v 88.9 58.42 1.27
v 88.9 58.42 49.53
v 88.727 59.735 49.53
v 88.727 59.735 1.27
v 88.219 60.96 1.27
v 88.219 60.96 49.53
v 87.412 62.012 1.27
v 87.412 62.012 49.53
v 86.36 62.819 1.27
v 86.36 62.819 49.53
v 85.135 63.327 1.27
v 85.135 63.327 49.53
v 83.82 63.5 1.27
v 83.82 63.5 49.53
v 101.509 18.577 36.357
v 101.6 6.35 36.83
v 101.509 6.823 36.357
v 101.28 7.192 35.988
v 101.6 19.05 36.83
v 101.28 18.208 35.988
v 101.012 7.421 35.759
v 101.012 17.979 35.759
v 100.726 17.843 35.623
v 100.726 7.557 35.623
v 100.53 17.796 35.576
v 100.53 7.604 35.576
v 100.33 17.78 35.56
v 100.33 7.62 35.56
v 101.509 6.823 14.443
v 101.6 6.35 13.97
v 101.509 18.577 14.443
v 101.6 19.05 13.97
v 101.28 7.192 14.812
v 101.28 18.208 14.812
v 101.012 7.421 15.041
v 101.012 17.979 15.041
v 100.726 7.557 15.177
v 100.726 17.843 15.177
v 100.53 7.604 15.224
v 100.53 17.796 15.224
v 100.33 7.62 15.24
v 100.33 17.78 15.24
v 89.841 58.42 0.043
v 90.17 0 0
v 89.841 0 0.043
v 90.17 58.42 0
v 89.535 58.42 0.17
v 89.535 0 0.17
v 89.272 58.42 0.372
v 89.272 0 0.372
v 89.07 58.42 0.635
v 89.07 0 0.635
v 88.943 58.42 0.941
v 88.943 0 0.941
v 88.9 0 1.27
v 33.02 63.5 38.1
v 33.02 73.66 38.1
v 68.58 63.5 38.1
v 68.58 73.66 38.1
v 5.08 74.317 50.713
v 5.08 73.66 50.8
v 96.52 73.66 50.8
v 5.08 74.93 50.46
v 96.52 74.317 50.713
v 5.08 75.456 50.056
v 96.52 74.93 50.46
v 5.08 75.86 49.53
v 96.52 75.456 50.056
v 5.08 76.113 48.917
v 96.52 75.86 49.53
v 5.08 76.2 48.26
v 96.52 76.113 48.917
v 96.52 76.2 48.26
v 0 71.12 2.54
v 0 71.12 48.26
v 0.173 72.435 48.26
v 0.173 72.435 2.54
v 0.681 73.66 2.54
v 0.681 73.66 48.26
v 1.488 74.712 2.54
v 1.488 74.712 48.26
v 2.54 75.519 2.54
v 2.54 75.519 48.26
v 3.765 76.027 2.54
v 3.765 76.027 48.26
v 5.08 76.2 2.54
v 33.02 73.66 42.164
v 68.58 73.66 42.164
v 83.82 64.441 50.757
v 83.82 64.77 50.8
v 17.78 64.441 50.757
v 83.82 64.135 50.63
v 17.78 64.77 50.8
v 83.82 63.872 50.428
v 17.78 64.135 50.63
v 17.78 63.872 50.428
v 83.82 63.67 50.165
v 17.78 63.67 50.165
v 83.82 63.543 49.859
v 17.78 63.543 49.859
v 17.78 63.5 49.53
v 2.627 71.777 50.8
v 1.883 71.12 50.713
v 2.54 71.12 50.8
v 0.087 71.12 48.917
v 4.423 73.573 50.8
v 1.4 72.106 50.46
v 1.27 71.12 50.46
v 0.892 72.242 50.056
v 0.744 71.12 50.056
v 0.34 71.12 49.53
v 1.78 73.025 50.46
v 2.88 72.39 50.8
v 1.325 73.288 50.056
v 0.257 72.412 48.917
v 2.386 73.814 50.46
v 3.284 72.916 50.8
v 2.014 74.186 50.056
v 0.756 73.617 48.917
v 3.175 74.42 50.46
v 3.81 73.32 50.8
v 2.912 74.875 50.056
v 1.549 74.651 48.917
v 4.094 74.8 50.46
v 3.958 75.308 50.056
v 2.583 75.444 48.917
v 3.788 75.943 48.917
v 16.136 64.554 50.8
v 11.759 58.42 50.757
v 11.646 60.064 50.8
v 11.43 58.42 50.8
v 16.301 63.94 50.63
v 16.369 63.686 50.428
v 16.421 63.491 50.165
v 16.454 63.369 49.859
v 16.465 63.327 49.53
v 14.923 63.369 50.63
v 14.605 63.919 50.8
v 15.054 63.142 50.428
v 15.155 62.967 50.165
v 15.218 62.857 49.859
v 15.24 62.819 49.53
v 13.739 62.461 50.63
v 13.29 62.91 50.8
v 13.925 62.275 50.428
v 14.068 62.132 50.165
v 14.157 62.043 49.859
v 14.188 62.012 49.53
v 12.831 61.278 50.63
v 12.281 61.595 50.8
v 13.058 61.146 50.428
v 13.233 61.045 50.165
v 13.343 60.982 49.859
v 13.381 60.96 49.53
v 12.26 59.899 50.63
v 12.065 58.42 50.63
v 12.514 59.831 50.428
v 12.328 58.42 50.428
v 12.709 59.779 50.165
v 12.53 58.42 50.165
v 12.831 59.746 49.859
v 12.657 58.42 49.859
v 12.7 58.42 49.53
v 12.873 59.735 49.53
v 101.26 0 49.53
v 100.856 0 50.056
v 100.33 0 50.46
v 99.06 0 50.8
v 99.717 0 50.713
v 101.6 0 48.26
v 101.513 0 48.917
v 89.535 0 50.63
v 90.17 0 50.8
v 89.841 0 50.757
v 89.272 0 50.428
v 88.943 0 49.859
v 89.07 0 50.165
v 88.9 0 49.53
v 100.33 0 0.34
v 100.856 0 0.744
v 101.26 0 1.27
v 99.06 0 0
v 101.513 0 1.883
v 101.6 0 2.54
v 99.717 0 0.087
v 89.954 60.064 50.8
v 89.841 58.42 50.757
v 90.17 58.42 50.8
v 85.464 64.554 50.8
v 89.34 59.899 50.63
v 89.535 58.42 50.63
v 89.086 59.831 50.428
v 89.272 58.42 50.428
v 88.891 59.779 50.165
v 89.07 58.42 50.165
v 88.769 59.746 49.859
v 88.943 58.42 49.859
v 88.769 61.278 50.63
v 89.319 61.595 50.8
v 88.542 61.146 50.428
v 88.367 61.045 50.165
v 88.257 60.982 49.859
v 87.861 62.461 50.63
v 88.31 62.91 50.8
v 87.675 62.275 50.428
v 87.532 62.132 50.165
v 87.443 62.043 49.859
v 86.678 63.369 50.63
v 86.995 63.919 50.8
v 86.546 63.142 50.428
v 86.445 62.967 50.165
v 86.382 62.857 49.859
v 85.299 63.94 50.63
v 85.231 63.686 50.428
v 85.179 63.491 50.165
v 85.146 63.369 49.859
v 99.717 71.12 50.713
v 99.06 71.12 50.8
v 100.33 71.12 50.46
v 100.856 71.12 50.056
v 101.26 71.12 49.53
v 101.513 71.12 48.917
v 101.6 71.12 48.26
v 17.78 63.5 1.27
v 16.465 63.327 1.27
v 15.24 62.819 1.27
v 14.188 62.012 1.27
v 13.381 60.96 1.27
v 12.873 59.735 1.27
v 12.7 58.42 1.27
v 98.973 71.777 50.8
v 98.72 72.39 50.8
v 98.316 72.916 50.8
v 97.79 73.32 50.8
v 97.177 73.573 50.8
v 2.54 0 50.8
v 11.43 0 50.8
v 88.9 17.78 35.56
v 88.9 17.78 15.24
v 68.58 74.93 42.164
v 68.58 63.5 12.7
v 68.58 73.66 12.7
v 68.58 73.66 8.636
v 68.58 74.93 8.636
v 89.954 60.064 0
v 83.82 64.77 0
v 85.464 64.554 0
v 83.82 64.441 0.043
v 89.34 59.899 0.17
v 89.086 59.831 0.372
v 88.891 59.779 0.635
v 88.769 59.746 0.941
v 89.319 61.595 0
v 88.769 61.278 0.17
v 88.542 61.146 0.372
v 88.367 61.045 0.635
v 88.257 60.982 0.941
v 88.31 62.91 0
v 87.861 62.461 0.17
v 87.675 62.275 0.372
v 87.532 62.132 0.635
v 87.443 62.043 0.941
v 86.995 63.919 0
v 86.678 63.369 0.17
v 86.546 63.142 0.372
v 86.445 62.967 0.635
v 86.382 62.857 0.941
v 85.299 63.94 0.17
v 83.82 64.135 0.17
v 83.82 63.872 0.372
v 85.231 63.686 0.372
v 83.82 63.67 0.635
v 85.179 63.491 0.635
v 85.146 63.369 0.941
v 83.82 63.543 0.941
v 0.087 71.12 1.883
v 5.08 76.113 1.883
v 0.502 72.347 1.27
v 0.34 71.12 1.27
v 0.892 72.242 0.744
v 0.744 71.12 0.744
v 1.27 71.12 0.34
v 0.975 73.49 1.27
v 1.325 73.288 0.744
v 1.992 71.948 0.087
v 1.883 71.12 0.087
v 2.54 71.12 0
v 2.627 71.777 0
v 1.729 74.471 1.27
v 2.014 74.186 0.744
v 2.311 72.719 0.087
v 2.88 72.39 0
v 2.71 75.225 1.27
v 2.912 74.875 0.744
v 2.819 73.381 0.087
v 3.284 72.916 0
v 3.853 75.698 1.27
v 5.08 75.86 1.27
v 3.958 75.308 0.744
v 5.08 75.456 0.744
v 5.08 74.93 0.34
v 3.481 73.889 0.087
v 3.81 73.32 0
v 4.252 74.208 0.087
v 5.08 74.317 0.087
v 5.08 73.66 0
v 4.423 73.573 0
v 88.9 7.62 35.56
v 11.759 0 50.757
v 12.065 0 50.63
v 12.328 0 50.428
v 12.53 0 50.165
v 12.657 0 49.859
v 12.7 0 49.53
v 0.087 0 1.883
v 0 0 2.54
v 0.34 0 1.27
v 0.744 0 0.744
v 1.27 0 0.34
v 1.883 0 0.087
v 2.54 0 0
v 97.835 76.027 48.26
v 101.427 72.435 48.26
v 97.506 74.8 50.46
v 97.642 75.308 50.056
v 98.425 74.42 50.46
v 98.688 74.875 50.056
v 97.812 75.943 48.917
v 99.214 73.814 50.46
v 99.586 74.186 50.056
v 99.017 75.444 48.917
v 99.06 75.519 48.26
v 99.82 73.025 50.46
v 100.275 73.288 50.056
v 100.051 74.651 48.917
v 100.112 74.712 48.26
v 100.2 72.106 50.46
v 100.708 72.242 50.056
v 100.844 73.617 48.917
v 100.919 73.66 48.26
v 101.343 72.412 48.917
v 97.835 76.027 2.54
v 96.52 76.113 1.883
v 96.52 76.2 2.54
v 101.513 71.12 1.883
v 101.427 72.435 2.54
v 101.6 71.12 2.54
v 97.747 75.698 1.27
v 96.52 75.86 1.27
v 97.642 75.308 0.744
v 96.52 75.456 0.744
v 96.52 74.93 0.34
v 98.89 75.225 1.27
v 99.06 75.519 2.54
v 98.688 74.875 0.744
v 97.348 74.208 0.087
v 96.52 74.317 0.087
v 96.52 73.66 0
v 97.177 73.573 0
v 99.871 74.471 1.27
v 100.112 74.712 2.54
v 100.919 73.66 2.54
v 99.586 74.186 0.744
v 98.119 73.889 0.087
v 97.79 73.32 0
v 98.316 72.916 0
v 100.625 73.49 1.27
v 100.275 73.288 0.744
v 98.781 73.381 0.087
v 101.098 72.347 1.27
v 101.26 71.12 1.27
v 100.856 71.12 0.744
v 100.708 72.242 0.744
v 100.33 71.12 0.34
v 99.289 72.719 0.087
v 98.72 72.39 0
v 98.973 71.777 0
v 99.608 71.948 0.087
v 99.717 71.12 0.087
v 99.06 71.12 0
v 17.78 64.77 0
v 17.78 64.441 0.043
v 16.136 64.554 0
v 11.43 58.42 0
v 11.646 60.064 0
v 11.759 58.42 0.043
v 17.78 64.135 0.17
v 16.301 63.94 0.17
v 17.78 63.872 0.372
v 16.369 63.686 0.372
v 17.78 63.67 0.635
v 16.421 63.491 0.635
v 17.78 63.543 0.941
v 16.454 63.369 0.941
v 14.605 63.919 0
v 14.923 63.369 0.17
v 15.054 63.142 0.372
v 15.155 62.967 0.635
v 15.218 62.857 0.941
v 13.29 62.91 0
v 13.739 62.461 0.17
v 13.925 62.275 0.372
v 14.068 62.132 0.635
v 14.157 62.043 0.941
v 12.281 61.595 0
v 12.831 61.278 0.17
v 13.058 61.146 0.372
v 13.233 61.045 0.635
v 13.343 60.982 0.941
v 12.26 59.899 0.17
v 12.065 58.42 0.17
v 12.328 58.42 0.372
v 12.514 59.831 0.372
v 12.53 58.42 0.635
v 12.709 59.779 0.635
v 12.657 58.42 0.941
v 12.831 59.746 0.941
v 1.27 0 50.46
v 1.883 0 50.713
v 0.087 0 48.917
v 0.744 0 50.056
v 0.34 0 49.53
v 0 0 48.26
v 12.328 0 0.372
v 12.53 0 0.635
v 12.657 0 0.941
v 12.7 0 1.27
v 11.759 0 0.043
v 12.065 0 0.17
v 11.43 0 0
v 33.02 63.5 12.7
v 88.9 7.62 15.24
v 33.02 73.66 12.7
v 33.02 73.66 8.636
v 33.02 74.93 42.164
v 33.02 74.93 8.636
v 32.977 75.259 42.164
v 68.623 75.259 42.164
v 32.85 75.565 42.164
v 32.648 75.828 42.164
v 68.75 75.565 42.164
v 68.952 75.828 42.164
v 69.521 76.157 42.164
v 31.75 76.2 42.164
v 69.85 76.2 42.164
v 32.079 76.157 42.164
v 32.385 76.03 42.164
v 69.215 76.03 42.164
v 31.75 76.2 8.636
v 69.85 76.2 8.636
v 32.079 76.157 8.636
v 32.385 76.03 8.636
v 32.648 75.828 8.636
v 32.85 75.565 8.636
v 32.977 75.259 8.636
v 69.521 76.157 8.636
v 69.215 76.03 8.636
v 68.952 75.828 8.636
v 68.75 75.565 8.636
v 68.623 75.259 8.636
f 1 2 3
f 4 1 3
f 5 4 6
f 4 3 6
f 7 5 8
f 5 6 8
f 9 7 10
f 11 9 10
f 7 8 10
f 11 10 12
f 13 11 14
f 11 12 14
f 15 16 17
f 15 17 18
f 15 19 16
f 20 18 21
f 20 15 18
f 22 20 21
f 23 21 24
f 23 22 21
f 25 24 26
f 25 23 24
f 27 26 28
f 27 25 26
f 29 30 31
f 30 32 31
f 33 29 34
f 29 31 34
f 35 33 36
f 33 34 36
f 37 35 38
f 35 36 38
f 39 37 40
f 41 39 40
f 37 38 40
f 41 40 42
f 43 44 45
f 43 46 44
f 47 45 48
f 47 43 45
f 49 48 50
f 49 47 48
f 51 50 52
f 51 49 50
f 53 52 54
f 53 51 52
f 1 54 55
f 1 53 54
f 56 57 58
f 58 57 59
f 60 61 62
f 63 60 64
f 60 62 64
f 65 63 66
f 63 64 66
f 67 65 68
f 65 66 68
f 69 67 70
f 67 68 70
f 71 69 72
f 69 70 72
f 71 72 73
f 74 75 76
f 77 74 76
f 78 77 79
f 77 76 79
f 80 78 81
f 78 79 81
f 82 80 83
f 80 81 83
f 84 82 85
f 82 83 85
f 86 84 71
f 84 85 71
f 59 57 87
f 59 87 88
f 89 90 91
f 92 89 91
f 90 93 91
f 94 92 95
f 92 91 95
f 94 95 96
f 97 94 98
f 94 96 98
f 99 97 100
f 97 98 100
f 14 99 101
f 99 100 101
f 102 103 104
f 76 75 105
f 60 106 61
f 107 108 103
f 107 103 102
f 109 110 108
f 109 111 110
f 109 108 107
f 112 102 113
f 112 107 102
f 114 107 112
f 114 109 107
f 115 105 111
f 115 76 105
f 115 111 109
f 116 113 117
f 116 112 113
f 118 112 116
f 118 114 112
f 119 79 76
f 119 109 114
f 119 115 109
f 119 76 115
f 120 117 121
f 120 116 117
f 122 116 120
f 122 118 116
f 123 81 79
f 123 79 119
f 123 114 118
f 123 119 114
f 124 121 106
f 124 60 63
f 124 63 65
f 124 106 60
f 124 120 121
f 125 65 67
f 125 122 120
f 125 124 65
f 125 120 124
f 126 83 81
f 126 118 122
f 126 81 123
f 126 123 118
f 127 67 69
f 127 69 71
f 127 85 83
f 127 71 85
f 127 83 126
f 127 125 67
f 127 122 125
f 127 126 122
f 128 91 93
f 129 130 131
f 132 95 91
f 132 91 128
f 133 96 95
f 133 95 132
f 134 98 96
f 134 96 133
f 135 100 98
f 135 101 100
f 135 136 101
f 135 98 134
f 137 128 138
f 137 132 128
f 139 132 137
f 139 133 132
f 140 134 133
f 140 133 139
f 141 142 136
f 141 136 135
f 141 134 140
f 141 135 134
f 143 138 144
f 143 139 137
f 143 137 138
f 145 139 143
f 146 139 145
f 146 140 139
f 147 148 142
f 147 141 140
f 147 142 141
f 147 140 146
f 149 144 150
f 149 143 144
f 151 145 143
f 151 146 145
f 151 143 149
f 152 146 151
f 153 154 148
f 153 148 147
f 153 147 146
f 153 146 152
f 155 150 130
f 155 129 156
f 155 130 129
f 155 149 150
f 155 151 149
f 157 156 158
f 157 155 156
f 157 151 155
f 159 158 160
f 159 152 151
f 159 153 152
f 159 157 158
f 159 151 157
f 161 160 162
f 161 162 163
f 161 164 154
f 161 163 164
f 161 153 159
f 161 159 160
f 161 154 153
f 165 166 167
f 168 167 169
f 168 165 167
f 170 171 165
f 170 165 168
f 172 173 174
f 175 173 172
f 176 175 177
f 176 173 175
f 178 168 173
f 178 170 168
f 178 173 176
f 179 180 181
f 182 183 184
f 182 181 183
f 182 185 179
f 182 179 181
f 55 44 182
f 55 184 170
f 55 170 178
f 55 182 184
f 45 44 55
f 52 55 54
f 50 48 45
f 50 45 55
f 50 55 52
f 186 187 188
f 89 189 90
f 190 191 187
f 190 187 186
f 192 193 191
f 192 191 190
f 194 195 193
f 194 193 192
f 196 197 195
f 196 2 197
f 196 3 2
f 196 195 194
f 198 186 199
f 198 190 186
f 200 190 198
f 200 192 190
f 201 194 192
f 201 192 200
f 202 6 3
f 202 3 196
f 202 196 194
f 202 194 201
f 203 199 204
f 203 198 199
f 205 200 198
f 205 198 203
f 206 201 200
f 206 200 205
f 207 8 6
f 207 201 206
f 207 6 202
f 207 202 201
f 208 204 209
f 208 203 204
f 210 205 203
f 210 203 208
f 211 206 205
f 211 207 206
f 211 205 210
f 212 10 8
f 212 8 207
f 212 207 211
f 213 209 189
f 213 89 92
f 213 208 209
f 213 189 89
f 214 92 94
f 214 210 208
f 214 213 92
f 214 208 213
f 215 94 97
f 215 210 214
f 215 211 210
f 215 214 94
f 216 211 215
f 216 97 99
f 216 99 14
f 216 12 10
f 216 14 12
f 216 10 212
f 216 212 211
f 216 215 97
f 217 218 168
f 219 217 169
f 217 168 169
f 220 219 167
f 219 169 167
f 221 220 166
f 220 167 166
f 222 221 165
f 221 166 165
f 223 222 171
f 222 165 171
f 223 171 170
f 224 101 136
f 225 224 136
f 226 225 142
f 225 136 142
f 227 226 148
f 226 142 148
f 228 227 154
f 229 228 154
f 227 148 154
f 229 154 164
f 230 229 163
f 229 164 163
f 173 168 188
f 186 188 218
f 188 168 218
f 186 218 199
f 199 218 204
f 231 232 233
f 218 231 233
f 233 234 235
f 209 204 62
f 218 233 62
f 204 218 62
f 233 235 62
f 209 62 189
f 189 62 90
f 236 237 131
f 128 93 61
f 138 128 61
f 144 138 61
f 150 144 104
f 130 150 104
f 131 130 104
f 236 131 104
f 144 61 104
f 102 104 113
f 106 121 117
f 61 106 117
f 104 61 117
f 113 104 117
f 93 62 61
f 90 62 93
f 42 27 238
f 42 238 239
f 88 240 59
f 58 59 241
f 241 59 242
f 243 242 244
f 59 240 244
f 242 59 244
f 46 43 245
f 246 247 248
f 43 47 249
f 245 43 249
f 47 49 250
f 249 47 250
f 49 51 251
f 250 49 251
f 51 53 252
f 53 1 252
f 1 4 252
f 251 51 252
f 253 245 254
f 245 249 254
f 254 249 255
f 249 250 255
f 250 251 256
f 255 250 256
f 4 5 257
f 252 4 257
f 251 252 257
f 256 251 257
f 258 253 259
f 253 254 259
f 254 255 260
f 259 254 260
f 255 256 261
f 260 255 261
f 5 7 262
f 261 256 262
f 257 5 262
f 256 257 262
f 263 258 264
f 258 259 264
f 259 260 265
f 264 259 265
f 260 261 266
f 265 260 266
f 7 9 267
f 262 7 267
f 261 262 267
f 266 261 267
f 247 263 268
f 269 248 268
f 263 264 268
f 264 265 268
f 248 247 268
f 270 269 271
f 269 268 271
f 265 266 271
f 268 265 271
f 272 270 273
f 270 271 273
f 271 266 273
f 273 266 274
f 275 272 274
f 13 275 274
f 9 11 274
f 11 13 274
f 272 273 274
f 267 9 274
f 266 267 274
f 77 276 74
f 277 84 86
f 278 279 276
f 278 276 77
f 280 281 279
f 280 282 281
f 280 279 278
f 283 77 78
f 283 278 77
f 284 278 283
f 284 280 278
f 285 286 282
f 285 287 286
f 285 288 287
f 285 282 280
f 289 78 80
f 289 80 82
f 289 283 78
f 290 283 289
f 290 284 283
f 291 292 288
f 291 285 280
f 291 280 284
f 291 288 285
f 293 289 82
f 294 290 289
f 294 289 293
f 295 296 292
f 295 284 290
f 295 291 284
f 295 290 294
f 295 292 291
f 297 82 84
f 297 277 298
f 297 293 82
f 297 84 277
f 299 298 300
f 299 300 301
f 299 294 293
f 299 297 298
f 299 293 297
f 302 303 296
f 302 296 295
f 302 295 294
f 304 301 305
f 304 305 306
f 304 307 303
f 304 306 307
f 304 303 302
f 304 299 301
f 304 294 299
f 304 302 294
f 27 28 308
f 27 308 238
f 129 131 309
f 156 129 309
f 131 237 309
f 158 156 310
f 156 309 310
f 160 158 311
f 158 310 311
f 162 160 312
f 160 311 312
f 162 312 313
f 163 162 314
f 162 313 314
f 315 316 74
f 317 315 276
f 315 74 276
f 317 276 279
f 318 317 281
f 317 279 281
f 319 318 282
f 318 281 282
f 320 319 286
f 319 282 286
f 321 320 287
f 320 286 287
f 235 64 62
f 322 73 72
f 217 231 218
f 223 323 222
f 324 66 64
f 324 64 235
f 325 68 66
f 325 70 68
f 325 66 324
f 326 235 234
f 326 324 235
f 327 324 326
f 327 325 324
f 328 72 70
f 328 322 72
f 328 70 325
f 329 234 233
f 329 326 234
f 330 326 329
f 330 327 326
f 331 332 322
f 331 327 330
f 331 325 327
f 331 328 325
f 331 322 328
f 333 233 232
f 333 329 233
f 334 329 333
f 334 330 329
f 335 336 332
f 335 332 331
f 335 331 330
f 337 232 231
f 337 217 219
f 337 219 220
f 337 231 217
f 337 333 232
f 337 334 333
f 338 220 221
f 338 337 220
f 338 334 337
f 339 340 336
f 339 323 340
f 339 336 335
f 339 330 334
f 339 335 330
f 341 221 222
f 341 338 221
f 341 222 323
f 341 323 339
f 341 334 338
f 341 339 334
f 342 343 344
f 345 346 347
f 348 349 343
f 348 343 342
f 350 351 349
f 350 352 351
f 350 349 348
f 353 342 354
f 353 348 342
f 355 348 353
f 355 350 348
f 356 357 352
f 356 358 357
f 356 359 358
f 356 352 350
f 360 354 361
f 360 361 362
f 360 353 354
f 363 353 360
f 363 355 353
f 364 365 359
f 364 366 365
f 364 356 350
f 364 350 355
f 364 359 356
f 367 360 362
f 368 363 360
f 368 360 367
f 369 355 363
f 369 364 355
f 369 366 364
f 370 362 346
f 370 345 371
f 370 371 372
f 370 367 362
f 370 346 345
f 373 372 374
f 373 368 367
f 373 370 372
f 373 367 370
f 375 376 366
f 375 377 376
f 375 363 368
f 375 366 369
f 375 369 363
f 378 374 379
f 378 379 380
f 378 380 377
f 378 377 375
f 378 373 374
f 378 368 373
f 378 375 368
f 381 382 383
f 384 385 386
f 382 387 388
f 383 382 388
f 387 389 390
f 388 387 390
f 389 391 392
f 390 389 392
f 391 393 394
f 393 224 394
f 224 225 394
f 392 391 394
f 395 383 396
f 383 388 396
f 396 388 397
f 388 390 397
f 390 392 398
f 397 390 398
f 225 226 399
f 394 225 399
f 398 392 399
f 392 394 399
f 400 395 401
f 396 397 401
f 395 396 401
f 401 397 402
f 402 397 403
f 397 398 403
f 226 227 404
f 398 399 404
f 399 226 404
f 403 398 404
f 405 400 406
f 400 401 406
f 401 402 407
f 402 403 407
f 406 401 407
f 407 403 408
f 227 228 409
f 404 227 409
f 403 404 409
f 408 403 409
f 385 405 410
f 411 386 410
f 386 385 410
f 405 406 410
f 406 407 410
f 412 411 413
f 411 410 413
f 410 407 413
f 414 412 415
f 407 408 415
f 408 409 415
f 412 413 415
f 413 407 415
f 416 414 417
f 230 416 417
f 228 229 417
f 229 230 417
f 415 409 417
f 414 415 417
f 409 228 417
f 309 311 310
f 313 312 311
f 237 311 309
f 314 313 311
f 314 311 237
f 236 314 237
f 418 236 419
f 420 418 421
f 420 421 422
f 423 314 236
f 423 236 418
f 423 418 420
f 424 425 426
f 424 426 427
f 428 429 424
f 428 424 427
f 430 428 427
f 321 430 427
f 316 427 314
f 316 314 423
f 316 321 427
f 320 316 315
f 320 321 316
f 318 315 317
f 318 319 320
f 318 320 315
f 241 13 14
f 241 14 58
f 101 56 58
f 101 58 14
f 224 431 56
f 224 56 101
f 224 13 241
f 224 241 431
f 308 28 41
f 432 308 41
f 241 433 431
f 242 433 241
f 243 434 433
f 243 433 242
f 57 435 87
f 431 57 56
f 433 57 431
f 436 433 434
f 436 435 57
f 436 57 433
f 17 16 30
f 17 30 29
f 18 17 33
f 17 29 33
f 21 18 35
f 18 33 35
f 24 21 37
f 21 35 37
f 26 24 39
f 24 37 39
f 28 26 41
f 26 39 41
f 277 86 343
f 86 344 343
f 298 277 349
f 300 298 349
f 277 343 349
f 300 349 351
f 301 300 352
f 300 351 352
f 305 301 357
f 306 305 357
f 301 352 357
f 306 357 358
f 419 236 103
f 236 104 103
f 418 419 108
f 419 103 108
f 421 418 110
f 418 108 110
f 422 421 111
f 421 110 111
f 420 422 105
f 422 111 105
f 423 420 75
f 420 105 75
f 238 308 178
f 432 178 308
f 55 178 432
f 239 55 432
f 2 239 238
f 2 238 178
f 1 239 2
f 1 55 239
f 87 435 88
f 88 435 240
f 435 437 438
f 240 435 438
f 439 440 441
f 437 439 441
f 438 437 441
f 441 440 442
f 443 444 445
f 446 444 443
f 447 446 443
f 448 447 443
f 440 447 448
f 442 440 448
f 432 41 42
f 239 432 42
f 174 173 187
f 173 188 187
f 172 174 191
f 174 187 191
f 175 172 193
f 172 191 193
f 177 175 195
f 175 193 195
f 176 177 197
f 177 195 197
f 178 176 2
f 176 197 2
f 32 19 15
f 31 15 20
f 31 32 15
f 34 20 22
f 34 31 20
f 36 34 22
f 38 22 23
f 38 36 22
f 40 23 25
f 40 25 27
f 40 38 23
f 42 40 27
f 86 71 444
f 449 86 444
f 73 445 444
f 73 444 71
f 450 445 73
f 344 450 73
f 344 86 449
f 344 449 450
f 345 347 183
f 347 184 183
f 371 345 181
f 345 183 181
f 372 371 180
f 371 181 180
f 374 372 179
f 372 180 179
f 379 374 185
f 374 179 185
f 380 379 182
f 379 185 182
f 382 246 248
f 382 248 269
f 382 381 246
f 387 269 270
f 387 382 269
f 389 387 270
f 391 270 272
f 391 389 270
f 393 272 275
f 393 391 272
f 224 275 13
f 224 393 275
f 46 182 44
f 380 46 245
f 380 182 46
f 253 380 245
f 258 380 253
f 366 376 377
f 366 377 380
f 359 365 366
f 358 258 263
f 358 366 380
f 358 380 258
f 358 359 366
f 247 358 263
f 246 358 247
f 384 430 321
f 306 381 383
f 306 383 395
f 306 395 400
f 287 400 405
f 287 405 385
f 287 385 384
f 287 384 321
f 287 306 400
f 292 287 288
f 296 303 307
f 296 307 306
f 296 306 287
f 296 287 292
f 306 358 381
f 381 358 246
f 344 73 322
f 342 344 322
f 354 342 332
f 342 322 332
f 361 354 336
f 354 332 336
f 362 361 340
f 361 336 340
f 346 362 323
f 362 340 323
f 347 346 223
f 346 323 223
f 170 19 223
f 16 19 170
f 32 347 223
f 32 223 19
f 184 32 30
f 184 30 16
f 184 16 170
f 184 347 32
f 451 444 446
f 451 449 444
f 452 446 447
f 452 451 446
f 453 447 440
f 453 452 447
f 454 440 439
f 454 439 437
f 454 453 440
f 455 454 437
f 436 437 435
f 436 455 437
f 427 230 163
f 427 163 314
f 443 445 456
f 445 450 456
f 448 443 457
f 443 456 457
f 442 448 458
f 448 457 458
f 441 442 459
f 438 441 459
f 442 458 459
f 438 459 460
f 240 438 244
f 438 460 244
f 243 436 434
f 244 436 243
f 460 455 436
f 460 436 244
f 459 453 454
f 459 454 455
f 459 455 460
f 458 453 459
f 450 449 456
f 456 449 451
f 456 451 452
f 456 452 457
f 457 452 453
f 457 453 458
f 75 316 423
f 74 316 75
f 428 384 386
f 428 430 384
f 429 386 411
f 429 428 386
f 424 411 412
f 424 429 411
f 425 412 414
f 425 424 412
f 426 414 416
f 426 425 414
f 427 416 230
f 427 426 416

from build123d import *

# Parameters (mm, degrees)
BOSS_EXTRUDE1_DEPTH = 50.8
FILLET1_R           = 5.08
SKETCH2_W           = 35.56
SKETCH2_H           = 33.528
CUT_EXTRUDE1_DEPTH  = 2.54
SKETCH4_W           = 35.56
SKETCH4_H           = 25.4
CUT_EXTRUDE2_DEPTH  = 74.66
FILLET2_R           = 1.27
CUT_EXTRUDE3_REACH  = 103.6
SKETCH6_W           = 20.32
SKETCH6_H           = 10.16
FILLET3_R           = 2.54
FILLET4_R           = 1.27
FILLET5_R           = 1.27


with BuildPart() as part:
    # Sketch1 → Boss-Extrude1 (new body)
    with BuildSketch(Plane.XY):
        Polygon((0, 0), (0, 76.2), (101.6, 76.2), (101.6, 0), (88.9, 0), (88.9, 63.5), (12.7, 63.5), (12.7, 0), align=None)
    extrude(amount=BOSS_EXTRUDE1_DEPTH)

    # Fillet1
    fillet1_edges = [part.edges().sort_by_distance(p)[0] for p in [
        (0, 76.2, 25.4),
        (101.6, 76.2, 25.4),
        (88.9, 63.5, 25.4),
        (12.7, 63.5, 25.4),
    ]]
    fillet(fillet1_edges, radius=FILLET1_R)

    # Sketch2 → Cut-Extrude1 (cut)
    with BuildSketch(Plane(origin=(0, 76.2, 0), x_dir=(1, 0, 0), z_dir=(0, 1, 0))):
        with Locations((50.8, -25.4)):
            Rectangle(SKETCH2_W, SKETCH2_H)
    extrude(amount=-CUT_EXTRUDE1_DEPTH, mode=Mode.SUBTRACT)

    # Sketch4 → Cut-Extrude2 (cut, through all)
    with BuildSketch(Plane(origin=(0, 73.66, 0), x_dir=(1, 0, 0), z_dir=(0, 1, 0))):
        with Locations((50.8, -25.4)):
            Rectangle(SKETCH4_W, SKETCH4_H)
    extrude(amount=-CUT_EXTRUDE2_DEPTH, mode=Mode.SUBTRACT)

    # Fillet2
    fillet2_edges = [part.edges().sort_by_distance(p)[0] for p in [
        (68.58, 76.2, 25.4),
        (33.02, 76.2, 25.4),
    ]]
    fillet(fillet2_edges, radius=FILLET2_R)

    # Sketch6 → Cut-Extrude3 (cut, up to next)
    with BuildSketch(Plane(origin=(101.6, 0, 0), x_dir=(0, 0, -1), z_dir=(1, 0, 0)), mode=Mode.PRIVATE) as cut_extrude3_sk1:
        with Locations((-25.4, 12.7)):
            Rectangle(SKETCH6_W, SKETCH6_H)
    cut_extrude3_tool1 = extrude(cut_extrude3_sk1.sketch, amount=-CUT_EXTRUDE3_REACH, mode=Mode.PRIVATE) & part.part
    add(cut_extrude3_tool1.solids().sort_by_distance((101.6, 12.7, 25.4))[0], mode=Mode.SUBTRACT)

    # Fillet3
    fillet3_edges = [part.edges().sort_by_distance(p)[0] for p in [
        (101.6, 35.56, 50.8),
        (50.8, 76.2, 0),
        (50.8, 76.2, 50.8),
        (0, 35.56, 0),
        (1.487897552, 74.712102448, 0),
        (100.112102448, 74.712102448, 0),
        (0, 35.56, 50.8),
        (1.487897552, 74.712102448, 50.8),
        (100.112102448, 74.712102448, 50.8),
        (101.6, 35.56, 0),
    ]]
    fillet(fillet3_edges, radius=FILLET3_R)

    # Fillet4
    fillet4_edges = [part.edges().sort_by_distance(p)[0] for p in [
        (101.6, 12.7, 35.56),
        (101.6, 17.78, 25.4),
        (101.6, 7.62, 25.4),
        (101.6, 12.7, 15.24),
    ]]
    fillet(fillet4_edges, radius=FILLET4_R)

    # Fillet5
    fillet5_edges = [part.edges().sort_by_distance(p)[0] for p in [
        (12.7, 29.21, 0),
        (88.9, 29.21, 0),
        (88.9, 29.21, 50.8),
        (50.8, 63.5, 0),
        (50.8, 63.5, 50.8),
        (87.412102448, 62.012102448, 0),
        (87.412102448, 62.012102448, 50.8),
        (14.187897552, 62.012102448, 0),
        (14.187897552, 62.012102448, 50.8),
        (12.7, 29.21, 50.8),
    ]]
    fillet(fillet5_edges, radius=FILLET5_R)


solid = part.part
